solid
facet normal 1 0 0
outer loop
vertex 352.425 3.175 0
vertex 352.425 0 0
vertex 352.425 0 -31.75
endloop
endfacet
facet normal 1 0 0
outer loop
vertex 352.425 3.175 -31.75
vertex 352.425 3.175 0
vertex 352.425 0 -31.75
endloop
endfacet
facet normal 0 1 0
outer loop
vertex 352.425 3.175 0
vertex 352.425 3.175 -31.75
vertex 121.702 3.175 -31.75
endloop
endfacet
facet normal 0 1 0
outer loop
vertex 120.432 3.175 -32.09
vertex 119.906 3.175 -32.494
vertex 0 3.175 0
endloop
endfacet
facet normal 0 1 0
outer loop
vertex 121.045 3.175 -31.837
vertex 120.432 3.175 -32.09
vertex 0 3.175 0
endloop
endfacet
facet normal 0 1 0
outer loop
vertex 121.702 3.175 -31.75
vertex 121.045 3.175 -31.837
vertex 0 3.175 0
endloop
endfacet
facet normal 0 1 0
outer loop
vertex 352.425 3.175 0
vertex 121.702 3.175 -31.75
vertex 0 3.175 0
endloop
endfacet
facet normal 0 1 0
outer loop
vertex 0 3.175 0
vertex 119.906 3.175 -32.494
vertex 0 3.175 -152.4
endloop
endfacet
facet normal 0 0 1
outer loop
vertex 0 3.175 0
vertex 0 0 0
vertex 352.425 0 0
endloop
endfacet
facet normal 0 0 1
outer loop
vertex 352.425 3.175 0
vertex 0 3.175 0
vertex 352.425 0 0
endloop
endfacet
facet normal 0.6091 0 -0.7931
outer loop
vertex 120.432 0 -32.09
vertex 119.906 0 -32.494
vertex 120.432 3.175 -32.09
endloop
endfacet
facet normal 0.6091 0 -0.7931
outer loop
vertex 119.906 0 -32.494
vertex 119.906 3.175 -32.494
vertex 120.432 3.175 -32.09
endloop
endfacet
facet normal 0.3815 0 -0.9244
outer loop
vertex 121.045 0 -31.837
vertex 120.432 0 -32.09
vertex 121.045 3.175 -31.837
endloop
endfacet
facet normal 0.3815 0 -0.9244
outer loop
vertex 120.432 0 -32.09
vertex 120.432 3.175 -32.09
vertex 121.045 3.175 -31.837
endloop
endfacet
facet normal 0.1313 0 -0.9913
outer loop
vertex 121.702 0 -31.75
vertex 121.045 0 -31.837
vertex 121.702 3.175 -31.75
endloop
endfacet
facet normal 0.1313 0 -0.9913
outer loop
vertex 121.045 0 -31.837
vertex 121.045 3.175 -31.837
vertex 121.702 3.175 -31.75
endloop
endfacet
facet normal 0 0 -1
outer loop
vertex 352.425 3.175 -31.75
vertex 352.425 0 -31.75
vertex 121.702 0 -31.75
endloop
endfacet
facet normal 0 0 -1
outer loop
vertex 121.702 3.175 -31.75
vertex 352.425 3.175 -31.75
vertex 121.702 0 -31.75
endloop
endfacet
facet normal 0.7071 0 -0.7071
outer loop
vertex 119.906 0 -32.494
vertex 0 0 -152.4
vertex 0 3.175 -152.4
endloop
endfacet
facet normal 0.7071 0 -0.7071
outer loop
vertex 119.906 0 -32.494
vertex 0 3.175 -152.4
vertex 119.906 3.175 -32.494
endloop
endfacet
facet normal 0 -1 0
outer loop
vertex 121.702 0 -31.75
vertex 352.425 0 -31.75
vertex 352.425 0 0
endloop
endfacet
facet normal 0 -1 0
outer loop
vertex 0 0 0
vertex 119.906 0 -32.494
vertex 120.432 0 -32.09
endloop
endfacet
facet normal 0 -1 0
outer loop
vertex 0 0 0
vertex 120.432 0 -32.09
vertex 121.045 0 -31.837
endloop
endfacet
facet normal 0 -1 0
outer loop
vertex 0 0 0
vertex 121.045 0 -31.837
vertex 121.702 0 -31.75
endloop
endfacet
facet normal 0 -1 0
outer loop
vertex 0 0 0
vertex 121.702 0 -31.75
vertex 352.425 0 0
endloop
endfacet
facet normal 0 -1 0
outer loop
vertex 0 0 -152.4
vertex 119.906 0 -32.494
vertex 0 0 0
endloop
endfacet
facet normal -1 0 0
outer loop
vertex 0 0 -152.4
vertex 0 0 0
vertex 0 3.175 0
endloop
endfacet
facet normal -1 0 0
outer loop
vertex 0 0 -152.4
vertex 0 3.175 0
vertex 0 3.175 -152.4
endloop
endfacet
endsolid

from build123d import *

# Parameters (mm, degrees)
BOSS_EXTRUDE1_DEPTH = 3.175
FILLET1_R           = 2.54


with BuildPart() as part:
    # Sketch1 → Boss-Extrude1 (new body)
    with BuildSketch(Plane(origin=(0, 0, 0), x_dir=(1, 0, 0), z_dir=(0, 1, 0))):
        Polygon((152.4, 0), (0, 0), (0, 152.4), align=None)
        Polygon((120.65, 31.75), (152.4, 0), (352.425, 0), (352.425, 31.75), (121.965128061, 31.75), align=None)
    extrude(amount=BOSS_EXTRUDE1_DEPTH)

    # Fillet1
    fillet1_edges = [part.edges().sort_by_distance(p)[0] for p in [
        (120.65, 1.5875, -31.75),
    ]]
    fillet(fillet1_edges, radius=FILLET1_R)


solid = part.part
